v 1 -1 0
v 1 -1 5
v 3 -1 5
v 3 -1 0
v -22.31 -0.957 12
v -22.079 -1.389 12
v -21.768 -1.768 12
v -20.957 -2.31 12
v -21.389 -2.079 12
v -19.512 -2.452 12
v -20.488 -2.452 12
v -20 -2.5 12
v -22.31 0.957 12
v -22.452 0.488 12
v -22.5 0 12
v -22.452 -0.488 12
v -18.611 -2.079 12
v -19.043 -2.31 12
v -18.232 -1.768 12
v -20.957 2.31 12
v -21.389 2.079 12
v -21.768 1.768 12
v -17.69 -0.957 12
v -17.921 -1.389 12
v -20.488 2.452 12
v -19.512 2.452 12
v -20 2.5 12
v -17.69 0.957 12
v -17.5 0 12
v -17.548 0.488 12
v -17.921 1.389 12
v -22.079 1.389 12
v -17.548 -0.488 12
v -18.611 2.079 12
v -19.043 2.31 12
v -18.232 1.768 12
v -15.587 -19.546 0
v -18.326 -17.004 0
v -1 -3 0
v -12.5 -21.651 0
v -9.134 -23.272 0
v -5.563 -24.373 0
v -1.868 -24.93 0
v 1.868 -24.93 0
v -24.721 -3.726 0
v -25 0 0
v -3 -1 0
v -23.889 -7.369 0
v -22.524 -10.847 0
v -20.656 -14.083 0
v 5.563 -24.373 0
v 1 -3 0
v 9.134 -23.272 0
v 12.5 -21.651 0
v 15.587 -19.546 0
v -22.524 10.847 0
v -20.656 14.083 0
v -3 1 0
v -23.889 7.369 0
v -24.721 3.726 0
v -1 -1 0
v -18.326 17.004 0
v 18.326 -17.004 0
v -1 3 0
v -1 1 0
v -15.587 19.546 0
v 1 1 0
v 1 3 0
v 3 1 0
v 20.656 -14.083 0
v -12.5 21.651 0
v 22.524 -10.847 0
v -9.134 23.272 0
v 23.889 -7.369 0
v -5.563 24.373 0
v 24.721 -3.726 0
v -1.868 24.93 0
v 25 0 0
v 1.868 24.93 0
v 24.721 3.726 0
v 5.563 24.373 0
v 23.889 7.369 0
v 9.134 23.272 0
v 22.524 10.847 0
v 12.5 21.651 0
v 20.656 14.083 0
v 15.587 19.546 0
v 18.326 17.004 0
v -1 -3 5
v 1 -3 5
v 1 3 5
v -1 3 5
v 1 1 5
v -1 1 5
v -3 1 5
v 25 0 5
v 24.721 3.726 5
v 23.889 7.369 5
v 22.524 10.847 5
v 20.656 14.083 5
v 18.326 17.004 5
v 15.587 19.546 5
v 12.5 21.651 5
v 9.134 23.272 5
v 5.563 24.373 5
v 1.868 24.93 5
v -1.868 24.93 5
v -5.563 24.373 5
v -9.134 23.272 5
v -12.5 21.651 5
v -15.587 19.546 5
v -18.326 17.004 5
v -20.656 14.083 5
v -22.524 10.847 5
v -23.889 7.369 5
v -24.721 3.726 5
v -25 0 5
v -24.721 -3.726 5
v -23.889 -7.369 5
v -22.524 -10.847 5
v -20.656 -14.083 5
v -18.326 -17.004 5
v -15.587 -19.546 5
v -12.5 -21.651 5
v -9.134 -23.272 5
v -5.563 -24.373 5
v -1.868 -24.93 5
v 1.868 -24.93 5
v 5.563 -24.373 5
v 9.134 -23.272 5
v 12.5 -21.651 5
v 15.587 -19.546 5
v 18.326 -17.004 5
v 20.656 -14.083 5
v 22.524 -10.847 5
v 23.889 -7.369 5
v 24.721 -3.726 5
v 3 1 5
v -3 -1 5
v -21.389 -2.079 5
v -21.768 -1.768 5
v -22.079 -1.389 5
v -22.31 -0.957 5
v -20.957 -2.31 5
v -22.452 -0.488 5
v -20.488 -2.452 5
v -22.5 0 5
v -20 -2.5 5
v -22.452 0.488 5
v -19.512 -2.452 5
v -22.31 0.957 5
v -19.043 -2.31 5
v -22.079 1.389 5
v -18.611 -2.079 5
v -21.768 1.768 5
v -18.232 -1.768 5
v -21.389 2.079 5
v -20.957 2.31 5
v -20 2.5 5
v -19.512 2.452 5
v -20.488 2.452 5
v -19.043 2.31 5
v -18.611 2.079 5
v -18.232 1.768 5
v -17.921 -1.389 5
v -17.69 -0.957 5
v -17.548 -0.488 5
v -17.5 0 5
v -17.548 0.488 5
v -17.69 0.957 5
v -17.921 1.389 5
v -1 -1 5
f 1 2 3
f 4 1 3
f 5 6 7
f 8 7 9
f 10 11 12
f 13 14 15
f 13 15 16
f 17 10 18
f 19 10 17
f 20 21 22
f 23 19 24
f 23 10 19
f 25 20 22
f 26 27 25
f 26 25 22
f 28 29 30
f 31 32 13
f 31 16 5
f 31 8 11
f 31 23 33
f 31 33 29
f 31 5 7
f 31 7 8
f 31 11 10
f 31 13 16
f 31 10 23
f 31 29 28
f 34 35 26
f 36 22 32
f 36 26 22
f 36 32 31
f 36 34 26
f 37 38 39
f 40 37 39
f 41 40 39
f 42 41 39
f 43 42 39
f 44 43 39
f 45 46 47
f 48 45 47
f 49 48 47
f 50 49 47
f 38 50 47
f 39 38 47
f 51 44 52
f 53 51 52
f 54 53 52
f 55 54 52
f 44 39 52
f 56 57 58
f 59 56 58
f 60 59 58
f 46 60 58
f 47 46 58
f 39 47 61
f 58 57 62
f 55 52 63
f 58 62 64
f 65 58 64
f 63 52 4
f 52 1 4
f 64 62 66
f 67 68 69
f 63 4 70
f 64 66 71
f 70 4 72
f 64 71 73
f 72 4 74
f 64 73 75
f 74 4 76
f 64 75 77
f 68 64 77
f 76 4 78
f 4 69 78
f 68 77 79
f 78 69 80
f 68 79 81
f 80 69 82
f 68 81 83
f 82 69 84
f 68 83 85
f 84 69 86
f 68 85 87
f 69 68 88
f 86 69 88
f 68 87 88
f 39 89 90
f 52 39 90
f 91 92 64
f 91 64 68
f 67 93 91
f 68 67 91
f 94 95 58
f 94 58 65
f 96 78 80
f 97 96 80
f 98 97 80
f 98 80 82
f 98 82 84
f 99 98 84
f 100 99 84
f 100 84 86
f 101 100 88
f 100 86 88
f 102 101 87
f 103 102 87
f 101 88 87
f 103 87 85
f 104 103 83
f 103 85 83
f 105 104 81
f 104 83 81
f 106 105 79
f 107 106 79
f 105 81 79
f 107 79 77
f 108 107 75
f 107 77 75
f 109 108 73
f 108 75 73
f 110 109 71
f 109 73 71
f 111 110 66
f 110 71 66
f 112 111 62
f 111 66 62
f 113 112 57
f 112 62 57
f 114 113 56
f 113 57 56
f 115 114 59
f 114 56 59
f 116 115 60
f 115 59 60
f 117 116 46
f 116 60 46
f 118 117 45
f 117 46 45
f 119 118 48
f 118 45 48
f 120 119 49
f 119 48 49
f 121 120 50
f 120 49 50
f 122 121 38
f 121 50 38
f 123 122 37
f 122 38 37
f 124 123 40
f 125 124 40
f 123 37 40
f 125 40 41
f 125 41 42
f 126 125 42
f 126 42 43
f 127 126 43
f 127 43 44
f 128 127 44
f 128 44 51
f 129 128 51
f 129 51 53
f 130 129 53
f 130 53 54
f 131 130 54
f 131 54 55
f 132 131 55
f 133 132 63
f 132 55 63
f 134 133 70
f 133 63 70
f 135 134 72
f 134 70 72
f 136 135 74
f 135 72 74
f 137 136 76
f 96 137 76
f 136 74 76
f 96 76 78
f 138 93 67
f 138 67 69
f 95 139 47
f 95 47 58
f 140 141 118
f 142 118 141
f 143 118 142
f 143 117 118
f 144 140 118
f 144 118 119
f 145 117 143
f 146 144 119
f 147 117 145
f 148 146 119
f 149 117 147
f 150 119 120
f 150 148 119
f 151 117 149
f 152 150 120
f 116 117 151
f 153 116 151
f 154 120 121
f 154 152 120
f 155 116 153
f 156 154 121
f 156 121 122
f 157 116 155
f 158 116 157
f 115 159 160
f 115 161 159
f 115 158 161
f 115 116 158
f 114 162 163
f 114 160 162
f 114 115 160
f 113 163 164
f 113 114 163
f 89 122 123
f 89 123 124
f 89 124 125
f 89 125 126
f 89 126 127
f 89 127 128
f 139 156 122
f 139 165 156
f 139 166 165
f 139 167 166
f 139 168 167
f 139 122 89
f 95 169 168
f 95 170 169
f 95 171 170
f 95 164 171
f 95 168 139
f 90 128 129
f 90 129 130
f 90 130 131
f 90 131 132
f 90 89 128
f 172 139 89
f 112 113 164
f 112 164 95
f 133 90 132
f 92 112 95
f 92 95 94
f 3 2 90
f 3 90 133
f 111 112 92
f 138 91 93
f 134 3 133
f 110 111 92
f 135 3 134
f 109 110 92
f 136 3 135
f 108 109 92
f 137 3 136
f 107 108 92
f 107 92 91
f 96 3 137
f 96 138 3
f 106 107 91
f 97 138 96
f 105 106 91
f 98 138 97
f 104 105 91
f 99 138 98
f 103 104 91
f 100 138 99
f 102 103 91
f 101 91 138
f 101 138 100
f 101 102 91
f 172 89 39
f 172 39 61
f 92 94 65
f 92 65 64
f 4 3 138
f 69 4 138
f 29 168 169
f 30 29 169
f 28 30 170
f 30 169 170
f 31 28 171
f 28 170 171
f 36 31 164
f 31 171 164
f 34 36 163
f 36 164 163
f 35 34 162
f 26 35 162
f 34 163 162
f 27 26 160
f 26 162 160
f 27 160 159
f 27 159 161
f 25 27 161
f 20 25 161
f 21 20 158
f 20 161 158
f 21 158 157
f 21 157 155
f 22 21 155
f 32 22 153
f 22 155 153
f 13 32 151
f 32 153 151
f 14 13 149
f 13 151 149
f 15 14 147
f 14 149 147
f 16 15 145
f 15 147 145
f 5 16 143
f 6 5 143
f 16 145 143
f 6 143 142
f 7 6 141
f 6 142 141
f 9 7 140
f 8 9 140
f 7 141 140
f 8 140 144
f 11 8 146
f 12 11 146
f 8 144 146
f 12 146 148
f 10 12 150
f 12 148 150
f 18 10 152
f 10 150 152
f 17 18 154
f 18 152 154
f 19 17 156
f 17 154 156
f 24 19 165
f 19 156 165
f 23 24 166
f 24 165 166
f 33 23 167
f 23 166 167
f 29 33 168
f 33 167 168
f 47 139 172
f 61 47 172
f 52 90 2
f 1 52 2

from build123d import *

# Parameters (mm, degrees)
SKETCH_1_R          = 25
EXTRUDE_1_DEPTH     = 5
SKETCH_2_R          = 2.5
EXTRUDE_2_DEPTH     = 7
SKETCH_3_W          = 2
SKETCH_3_H          = 2
CUT_EXTRUDE_1_DEPTH = 37.041642582


with BuildPart() as part:
    # 草图1 → 凸台-拉伸1 (new body)
    with BuildSketch(Plane.XY):
        Circle(SKETCH_1_R)
    extrude(amount=EXTRUDE_1_DEPTH)

    # 草图2 → 凸台-拉伸2 (add)
    with BuildSketch(Plane.XY.offset(5)):
        with Locations((-20, 0)):
            Circle(SKETCH_2_R)
    extrude(amount=EXTRUDE_2_DEPTH)

    # 草图3 → 切除-拉伸1 (cut, through all)
    with BuildSketch(Plane.XY.offset(5)):
        with Locations((0, 2)):
            Rectangle(SKETCH_3_W, SKETCH_3_H)
        with Locations((-2, 0)):
            Rectangle(SKETCH_3_W, SKETCH_3_H)
        with Locations((2, 0)):
            Rectangle(SKETCH_3_W, SKETCH_3_H)
        with Locations((0, -2)):
            Rectangle(SKETCH_3_W, SKETCH_3_H)
        Rectangle(SKETCH_3_W, SKETCH_3_H)
    extrude(amount=-CUT_EXTRUDE_1_DEPTH, mode=Mode.SUBTRACT)


solid = part.part
